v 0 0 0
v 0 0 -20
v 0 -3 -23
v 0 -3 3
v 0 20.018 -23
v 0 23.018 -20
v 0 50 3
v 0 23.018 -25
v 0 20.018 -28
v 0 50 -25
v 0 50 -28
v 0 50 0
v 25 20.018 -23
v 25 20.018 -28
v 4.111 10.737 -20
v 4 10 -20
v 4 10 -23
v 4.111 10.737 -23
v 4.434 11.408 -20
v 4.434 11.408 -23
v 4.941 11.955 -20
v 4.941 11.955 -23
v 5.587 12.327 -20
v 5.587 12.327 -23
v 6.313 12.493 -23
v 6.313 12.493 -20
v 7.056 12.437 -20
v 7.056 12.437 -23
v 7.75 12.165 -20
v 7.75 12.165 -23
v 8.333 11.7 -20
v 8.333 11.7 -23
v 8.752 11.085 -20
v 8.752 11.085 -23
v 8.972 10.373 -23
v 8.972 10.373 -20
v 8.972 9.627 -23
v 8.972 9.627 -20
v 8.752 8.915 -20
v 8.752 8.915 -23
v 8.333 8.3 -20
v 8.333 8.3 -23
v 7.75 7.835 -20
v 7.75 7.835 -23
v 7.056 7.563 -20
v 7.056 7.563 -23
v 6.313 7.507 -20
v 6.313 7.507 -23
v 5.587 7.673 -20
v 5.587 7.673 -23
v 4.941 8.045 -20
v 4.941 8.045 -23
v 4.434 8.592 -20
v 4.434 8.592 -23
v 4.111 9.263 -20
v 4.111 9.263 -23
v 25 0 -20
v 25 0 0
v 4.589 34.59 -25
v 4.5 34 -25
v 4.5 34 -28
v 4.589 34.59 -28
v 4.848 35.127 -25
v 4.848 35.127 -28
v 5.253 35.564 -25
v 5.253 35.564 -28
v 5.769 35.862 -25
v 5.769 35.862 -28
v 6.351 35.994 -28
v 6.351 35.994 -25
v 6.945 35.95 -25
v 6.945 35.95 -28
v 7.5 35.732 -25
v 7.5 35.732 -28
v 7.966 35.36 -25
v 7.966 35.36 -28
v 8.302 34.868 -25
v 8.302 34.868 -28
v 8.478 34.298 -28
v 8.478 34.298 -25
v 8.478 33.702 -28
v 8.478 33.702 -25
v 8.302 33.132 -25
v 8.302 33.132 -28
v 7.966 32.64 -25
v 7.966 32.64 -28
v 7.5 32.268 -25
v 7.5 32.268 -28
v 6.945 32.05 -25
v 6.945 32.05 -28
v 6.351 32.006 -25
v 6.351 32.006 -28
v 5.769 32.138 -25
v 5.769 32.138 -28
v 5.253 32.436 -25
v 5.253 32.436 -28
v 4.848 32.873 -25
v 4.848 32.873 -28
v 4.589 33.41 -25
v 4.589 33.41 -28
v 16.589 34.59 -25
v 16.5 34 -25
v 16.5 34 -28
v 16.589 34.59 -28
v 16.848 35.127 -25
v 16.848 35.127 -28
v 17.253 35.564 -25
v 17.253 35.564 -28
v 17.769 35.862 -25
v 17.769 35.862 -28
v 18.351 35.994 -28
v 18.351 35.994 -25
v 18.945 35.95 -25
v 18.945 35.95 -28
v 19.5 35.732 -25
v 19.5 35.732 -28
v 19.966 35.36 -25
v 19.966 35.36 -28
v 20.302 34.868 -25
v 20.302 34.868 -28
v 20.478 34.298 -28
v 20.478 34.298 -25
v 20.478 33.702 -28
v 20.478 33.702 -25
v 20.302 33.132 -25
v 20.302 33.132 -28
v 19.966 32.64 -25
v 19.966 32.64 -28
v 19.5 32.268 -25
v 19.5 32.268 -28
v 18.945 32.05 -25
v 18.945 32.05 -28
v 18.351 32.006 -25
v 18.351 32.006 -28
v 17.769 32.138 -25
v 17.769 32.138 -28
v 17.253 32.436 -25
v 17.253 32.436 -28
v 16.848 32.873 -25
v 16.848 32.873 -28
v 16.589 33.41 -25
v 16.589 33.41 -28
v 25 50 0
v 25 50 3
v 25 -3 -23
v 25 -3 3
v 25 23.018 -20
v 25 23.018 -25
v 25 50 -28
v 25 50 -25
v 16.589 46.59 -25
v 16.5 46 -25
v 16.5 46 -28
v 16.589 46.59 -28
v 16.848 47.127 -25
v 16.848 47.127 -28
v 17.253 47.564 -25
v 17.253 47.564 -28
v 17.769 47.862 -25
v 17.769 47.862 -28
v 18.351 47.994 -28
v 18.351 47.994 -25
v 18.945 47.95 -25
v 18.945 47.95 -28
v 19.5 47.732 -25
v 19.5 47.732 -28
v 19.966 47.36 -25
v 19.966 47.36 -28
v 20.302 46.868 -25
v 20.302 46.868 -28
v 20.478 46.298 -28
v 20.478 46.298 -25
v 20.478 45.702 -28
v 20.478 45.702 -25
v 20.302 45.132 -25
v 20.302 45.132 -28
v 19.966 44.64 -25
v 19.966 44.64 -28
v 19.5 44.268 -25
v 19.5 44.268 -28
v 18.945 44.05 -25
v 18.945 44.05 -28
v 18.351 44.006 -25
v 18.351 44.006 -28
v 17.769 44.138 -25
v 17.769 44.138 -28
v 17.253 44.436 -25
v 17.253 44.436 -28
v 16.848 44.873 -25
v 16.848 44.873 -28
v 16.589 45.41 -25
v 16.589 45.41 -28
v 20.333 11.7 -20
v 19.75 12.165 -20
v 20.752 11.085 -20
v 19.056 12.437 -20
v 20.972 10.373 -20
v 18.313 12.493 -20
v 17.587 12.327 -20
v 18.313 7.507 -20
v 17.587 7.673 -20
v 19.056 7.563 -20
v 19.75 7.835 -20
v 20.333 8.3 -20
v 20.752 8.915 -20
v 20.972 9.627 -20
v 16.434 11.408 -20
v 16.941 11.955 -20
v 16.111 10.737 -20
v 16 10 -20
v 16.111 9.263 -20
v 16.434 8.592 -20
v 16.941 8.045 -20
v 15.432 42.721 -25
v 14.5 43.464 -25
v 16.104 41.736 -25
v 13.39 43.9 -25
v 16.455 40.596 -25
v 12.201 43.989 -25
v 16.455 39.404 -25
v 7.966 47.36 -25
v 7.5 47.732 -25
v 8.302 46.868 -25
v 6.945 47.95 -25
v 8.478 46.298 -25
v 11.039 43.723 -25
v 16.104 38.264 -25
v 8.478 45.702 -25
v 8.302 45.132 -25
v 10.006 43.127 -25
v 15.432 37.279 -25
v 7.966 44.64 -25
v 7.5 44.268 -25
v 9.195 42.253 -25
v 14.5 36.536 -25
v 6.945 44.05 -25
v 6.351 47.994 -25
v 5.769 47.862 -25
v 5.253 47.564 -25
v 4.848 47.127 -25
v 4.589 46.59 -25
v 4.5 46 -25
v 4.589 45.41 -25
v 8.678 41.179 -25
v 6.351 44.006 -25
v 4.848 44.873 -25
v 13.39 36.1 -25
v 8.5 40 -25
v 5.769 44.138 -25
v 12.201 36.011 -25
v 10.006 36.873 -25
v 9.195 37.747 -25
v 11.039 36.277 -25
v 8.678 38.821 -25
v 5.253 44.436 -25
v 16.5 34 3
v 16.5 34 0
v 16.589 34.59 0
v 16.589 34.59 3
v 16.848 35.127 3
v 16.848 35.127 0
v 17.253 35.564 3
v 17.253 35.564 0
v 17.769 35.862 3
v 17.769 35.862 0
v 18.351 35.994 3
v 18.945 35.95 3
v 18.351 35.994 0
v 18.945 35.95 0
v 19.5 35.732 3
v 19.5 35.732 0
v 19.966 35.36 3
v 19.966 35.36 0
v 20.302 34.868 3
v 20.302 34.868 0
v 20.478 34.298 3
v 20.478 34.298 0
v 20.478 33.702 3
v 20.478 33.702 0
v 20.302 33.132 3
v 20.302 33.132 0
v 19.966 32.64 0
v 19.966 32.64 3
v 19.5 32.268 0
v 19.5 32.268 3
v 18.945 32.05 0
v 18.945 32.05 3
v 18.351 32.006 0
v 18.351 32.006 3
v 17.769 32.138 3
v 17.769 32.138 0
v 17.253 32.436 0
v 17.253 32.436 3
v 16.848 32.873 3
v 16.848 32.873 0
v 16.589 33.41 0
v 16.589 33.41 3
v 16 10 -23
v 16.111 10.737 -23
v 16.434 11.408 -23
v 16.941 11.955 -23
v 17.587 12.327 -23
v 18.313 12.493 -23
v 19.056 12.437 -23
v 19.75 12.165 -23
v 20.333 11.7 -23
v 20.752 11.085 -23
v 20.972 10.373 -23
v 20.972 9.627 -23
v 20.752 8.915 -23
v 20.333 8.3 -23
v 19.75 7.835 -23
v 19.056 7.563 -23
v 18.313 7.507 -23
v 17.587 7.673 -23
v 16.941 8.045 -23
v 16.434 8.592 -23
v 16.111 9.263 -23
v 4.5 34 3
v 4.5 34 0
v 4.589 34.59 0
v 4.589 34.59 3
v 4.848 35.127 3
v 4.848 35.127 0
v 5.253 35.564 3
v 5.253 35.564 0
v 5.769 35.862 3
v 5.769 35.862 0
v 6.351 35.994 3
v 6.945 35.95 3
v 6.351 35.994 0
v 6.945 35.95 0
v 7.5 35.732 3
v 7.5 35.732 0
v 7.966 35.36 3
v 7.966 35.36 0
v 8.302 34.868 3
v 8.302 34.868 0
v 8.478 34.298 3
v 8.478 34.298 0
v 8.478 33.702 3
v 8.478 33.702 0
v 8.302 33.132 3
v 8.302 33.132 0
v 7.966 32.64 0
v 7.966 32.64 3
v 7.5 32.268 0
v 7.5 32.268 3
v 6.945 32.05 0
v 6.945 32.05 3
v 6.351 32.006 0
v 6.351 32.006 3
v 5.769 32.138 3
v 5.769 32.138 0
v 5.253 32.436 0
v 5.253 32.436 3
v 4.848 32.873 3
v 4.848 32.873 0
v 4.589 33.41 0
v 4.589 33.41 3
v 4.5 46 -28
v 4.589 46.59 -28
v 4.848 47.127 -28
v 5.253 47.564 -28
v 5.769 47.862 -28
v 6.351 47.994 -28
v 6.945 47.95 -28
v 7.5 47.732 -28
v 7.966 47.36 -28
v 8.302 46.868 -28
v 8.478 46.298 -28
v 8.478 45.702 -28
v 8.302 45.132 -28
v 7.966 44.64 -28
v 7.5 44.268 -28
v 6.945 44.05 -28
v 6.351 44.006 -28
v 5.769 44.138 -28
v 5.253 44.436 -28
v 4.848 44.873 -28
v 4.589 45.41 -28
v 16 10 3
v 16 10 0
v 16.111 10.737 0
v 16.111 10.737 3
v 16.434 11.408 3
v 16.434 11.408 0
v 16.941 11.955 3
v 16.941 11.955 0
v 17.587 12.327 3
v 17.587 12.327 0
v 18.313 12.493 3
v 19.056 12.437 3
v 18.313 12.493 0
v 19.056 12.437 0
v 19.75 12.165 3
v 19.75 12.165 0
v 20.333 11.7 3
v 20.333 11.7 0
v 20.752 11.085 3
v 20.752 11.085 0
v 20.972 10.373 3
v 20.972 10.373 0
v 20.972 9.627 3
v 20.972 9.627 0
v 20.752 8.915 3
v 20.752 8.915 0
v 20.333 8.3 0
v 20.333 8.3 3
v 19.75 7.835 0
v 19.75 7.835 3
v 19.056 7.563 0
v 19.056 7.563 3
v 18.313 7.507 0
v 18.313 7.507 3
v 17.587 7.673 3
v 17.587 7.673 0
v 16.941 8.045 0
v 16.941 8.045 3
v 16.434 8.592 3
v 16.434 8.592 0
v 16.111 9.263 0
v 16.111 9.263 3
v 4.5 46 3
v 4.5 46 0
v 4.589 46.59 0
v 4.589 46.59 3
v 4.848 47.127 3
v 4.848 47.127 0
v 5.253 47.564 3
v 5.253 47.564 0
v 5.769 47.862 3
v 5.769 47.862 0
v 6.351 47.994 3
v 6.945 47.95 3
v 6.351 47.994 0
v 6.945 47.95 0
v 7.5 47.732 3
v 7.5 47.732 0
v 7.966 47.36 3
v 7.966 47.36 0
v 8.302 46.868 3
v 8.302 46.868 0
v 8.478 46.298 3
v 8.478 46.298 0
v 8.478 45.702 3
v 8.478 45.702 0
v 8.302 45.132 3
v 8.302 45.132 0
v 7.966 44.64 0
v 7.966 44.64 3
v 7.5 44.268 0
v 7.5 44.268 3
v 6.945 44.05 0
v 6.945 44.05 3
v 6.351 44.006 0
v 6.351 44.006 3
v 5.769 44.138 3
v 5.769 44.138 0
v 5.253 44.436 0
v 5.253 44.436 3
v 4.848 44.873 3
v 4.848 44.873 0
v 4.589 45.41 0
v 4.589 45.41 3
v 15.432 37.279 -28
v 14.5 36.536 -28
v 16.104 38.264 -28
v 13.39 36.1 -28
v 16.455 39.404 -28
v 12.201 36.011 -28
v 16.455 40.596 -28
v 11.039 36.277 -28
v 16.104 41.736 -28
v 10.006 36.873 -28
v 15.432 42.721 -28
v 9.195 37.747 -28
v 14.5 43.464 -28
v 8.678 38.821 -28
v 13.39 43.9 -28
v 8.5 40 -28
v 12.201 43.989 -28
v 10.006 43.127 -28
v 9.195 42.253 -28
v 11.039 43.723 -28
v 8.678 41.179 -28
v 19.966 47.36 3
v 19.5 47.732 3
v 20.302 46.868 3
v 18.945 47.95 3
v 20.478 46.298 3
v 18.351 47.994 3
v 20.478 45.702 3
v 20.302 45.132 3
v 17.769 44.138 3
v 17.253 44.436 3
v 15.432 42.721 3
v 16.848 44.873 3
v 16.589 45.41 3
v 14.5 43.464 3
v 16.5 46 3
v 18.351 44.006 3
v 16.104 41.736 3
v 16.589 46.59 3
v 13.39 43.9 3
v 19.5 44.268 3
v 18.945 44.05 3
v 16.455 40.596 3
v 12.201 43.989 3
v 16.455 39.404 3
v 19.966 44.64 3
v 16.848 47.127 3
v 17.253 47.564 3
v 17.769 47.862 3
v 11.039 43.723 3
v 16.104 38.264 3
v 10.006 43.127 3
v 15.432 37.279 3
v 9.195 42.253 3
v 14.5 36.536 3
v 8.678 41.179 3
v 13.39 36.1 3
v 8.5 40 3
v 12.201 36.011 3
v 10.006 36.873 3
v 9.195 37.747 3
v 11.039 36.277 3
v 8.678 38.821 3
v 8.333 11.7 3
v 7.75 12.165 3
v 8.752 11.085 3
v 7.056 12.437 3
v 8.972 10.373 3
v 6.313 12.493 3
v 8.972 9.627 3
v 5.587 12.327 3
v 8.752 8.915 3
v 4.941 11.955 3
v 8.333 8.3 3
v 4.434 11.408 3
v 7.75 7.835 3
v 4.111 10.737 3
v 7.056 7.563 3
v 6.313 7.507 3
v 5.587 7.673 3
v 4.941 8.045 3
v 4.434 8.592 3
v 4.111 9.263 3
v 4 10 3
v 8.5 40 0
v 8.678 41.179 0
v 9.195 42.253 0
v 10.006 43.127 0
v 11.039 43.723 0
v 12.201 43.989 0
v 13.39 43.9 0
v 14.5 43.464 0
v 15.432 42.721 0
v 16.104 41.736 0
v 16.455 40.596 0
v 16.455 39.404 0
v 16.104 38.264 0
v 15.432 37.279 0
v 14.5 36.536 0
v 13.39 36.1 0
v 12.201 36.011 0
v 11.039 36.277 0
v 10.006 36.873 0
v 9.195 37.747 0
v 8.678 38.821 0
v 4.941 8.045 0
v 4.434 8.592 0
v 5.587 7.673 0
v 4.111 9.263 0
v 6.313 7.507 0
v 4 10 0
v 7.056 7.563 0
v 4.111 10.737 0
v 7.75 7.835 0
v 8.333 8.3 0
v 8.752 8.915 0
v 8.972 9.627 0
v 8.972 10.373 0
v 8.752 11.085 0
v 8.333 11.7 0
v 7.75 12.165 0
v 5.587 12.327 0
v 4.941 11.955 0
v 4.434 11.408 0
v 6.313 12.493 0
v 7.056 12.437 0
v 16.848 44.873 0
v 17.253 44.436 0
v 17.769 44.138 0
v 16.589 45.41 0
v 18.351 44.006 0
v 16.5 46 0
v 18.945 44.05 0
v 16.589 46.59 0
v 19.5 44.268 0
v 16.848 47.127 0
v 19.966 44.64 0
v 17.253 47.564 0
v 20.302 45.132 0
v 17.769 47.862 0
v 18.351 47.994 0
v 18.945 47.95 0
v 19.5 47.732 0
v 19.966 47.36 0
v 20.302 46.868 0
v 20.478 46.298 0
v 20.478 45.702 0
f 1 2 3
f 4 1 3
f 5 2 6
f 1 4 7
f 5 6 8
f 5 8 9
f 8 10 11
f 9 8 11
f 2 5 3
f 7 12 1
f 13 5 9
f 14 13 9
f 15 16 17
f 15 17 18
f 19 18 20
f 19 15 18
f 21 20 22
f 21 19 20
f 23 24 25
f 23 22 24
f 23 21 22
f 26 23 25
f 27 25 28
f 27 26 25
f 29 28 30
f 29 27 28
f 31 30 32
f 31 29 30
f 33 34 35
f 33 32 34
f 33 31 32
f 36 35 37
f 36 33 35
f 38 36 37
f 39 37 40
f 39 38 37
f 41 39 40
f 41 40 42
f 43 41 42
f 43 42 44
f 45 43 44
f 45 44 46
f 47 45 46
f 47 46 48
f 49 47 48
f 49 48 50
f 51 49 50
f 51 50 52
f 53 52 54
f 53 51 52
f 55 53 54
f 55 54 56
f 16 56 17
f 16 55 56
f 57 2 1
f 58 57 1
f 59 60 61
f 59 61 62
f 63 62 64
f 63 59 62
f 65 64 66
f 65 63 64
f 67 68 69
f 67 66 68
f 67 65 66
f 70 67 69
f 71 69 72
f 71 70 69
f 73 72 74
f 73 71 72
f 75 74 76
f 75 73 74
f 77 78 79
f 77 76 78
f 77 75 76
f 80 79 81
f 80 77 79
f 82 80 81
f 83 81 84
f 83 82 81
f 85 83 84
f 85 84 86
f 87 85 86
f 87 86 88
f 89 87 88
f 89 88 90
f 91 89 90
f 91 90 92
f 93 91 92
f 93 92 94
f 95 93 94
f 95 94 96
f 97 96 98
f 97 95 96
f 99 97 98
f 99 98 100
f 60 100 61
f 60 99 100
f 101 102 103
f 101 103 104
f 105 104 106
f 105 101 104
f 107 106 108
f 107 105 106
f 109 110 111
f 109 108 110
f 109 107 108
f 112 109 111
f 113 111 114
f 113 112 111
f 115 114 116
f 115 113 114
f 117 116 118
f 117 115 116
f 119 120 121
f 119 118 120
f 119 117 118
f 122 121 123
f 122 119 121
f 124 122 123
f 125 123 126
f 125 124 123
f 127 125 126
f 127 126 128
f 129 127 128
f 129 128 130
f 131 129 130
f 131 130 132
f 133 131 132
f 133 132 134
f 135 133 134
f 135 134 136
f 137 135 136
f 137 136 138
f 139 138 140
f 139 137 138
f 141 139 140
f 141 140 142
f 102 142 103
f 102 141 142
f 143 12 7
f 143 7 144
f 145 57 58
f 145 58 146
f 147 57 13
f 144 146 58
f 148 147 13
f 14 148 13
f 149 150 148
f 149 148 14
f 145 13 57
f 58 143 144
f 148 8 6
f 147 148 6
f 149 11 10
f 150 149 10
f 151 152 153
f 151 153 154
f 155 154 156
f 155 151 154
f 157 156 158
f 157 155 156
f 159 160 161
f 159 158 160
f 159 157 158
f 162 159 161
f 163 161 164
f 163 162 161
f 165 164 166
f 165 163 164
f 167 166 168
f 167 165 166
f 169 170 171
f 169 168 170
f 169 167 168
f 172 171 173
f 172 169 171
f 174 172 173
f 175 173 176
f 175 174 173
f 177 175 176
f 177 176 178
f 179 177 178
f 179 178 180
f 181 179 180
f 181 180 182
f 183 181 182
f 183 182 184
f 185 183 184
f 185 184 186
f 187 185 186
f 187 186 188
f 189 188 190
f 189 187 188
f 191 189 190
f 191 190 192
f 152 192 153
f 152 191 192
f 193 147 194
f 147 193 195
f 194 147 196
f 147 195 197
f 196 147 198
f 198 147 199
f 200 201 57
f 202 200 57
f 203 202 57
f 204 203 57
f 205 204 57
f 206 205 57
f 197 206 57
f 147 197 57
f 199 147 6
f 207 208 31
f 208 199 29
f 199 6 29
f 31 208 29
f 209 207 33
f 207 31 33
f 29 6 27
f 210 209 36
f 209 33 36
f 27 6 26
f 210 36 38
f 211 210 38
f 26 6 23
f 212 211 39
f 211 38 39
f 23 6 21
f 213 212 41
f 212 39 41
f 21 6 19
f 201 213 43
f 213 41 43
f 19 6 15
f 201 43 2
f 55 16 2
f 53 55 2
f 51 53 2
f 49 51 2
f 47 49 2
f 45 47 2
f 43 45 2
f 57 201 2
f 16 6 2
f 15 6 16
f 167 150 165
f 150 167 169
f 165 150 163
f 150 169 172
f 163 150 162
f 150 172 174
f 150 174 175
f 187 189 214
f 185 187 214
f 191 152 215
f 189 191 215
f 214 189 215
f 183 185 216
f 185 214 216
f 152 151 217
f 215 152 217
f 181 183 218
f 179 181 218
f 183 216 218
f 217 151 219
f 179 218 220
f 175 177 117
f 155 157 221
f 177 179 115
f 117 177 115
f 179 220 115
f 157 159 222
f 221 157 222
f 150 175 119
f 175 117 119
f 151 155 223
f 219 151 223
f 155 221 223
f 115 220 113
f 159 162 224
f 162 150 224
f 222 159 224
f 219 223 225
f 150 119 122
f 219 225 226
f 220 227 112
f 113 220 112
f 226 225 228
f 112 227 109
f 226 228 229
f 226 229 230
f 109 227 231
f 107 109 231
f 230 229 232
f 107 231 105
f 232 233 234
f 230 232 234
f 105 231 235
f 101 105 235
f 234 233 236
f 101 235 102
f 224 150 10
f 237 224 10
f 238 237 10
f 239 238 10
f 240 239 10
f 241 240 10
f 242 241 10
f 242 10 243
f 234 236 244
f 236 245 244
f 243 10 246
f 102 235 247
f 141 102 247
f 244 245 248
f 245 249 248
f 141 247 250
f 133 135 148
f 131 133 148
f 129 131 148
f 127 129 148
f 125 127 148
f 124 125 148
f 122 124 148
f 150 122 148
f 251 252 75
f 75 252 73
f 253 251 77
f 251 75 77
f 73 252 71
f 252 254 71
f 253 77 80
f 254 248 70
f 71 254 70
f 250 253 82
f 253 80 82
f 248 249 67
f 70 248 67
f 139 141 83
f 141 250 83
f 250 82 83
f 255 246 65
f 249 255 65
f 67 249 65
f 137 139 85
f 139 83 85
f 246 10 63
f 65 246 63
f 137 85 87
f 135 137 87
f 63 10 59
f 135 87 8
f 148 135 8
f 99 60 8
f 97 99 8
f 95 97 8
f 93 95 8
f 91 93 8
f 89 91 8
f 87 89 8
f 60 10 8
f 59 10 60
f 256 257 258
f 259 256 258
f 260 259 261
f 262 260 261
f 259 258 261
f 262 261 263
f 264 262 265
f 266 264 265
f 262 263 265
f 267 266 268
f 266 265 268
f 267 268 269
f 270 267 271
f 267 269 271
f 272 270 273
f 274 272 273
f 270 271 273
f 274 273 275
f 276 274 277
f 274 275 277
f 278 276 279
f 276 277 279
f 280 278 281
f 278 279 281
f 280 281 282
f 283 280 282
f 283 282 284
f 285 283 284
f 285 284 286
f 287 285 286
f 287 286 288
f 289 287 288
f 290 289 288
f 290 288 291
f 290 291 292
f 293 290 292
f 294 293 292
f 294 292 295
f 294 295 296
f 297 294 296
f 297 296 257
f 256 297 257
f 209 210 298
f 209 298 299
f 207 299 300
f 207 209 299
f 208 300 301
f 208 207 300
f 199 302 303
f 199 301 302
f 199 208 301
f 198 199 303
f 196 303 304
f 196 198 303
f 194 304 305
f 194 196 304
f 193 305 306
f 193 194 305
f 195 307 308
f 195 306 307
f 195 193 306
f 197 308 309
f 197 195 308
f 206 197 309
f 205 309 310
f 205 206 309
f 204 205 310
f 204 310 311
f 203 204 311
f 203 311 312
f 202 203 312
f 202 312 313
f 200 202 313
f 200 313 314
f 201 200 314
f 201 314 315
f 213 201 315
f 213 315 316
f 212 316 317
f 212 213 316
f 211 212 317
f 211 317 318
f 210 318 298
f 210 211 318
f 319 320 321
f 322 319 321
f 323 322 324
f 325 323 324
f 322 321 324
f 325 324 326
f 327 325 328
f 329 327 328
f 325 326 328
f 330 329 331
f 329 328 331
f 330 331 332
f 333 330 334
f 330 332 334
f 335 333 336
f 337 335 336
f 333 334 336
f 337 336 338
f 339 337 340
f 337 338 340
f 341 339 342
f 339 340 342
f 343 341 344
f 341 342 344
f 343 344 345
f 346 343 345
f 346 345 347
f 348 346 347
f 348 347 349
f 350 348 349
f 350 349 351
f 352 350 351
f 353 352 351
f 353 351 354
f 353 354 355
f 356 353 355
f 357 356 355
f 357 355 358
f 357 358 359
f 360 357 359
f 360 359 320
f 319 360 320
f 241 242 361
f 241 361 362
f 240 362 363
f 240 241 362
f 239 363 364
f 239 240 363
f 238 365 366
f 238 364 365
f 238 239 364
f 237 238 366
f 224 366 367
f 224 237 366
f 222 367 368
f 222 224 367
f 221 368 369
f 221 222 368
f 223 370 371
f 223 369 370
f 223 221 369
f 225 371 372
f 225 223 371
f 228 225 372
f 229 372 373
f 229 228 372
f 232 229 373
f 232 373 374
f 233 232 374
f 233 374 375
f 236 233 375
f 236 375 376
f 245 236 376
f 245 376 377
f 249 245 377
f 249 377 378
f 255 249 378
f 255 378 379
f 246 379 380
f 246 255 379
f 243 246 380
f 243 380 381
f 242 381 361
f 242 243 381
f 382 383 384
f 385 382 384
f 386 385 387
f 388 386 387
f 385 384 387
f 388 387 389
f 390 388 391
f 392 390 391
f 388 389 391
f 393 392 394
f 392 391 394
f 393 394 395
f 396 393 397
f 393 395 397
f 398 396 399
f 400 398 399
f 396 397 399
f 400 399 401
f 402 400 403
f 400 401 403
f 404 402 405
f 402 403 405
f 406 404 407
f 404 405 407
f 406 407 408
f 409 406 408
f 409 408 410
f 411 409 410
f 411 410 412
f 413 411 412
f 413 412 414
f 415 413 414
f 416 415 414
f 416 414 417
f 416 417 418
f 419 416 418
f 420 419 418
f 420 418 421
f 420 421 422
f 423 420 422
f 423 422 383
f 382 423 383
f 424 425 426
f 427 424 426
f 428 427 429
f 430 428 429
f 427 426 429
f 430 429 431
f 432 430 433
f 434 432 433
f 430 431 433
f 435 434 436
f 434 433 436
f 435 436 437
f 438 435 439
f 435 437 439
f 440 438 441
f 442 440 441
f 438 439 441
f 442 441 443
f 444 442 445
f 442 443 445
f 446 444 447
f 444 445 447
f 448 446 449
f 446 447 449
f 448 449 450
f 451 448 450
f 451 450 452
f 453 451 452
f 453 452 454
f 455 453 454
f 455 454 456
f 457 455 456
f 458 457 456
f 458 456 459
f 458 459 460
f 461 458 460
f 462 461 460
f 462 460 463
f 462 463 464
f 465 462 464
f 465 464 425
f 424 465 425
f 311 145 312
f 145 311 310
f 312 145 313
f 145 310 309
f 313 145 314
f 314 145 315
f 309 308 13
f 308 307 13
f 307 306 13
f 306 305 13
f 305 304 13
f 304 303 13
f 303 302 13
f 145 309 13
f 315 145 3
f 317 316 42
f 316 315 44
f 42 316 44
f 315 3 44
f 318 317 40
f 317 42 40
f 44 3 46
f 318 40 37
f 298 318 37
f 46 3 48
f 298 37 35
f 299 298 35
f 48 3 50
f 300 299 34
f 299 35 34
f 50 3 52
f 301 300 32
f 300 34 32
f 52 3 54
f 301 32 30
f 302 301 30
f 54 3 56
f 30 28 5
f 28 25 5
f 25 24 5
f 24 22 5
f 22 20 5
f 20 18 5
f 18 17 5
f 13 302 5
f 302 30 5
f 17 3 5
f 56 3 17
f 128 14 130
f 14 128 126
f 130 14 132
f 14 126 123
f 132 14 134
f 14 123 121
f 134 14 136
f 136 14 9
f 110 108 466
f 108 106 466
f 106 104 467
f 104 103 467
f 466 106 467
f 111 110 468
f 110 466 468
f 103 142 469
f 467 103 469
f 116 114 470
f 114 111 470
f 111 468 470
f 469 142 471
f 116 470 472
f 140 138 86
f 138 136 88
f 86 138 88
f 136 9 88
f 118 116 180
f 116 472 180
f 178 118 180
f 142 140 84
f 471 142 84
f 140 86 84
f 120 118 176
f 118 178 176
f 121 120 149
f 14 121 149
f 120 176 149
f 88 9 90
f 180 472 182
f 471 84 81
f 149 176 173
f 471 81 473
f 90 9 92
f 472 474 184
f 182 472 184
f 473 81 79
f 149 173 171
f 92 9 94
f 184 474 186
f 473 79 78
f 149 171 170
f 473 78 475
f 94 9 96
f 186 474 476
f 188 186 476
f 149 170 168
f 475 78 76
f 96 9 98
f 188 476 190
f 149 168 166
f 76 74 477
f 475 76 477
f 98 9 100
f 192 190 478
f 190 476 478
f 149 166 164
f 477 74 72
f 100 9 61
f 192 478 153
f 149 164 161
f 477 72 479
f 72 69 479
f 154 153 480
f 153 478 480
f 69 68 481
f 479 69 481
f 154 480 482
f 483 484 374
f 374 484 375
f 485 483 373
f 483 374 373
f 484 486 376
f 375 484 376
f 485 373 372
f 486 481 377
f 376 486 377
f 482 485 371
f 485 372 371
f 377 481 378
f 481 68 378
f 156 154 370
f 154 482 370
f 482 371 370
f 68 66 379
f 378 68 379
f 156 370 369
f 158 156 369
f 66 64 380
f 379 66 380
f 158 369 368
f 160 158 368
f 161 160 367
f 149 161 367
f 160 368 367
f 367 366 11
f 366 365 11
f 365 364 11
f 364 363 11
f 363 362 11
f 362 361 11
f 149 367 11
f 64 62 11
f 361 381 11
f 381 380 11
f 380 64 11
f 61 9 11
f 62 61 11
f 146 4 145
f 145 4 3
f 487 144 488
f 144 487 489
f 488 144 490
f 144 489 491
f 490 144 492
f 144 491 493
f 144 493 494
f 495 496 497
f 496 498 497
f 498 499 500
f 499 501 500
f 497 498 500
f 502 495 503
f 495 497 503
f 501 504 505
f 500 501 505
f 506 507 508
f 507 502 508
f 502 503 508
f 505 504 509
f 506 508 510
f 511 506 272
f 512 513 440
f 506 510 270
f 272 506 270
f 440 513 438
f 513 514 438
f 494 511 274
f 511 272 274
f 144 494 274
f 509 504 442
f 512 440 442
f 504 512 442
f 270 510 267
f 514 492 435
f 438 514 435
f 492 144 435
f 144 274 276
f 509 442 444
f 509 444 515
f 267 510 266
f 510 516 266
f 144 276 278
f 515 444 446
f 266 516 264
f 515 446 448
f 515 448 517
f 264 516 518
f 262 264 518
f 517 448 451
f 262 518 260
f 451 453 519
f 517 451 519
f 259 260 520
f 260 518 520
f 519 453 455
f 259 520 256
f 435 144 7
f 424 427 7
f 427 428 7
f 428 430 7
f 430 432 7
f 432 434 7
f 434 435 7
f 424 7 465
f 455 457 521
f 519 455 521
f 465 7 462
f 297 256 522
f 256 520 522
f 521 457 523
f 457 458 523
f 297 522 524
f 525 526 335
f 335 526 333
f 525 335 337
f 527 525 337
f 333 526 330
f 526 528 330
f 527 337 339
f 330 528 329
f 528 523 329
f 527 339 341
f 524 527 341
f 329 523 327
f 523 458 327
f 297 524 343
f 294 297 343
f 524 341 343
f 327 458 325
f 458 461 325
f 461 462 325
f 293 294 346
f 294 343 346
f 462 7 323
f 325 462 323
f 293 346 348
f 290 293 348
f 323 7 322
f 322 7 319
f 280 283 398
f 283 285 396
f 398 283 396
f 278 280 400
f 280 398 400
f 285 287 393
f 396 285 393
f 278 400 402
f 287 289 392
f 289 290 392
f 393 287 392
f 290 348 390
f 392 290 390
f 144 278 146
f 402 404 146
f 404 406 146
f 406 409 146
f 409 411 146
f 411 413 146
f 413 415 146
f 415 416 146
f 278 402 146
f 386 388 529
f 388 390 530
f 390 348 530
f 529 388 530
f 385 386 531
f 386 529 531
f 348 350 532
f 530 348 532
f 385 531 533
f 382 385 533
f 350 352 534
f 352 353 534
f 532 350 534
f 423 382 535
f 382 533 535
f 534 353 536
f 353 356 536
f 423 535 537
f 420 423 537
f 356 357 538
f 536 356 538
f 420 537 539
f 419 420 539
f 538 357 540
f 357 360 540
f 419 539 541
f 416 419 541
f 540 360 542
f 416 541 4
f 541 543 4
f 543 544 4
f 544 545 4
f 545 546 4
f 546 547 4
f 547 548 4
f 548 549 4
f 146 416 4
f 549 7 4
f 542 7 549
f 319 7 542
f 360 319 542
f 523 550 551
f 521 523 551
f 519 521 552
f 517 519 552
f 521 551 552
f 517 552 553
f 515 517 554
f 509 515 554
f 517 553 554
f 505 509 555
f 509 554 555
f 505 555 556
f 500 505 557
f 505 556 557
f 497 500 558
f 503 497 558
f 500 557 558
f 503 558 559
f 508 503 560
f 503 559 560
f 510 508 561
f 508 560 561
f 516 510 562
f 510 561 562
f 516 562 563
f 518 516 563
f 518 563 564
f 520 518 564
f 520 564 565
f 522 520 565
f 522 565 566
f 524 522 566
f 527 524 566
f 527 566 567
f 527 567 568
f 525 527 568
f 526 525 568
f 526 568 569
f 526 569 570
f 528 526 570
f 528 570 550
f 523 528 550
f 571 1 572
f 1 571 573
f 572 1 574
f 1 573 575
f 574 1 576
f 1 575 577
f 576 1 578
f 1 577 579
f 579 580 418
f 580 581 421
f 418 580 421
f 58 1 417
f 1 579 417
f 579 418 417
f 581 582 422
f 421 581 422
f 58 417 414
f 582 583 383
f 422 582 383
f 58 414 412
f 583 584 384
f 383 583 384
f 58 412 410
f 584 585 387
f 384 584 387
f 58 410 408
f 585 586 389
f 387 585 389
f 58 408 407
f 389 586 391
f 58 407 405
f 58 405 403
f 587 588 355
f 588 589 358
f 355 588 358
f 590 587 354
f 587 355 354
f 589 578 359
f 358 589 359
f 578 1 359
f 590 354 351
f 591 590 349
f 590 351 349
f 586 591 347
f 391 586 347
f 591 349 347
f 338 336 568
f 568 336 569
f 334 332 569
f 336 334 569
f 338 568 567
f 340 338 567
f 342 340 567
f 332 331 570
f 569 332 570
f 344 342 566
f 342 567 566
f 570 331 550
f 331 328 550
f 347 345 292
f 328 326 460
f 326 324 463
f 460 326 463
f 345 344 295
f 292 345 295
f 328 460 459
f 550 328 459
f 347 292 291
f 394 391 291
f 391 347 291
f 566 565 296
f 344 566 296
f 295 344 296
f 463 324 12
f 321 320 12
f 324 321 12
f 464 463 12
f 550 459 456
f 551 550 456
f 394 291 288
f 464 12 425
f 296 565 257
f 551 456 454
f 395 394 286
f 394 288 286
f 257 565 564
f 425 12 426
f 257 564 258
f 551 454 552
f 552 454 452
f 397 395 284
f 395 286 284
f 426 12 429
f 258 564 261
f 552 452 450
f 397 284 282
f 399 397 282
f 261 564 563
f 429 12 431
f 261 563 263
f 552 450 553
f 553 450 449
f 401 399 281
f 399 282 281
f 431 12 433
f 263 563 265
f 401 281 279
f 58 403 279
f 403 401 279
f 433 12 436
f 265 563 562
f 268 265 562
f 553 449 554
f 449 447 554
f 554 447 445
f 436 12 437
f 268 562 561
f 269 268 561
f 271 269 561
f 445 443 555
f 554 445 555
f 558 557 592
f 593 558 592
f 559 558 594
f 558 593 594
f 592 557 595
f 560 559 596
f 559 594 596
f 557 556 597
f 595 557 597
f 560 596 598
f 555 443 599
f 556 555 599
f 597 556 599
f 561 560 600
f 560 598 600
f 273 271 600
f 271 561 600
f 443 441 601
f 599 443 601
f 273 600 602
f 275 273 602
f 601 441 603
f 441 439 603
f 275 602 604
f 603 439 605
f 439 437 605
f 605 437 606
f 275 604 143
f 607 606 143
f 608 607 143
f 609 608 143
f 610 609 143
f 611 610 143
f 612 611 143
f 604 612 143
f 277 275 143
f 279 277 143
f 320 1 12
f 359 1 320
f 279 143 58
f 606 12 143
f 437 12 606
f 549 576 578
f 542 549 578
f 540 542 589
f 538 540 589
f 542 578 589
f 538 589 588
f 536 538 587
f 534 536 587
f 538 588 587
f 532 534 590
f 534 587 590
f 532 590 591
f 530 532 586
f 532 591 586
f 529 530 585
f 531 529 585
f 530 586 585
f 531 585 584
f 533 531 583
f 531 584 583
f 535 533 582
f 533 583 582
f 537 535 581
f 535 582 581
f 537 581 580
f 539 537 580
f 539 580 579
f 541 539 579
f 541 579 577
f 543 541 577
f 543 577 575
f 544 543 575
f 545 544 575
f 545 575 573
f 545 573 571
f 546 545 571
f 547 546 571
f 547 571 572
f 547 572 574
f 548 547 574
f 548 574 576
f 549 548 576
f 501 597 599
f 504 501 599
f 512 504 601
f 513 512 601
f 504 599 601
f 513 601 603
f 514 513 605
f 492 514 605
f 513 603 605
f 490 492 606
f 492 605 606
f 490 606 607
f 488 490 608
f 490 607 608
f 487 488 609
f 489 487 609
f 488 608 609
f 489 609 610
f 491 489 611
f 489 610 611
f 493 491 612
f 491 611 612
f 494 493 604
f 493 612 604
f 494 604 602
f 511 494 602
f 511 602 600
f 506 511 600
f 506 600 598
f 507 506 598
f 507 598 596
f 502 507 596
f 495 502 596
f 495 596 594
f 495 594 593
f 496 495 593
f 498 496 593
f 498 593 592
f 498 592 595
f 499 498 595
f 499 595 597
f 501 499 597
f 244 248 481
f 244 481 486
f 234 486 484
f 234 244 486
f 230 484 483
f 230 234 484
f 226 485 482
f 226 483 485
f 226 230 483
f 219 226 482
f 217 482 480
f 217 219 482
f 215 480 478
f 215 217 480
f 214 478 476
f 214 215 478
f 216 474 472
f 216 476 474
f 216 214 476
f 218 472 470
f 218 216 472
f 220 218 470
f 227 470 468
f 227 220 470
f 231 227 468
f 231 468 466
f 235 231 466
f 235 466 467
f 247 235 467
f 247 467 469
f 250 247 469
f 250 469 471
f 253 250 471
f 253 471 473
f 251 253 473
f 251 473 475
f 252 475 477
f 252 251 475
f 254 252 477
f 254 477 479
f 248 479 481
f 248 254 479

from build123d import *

# Parameters (mm, degrees)
SKETCH_1_W                      = 25
SKETCH_1_H                      = 50
EXTRUDE_1_DEPTH                 = 3
EXTRUDE_2_DEPTH                 = 25
CUT_EXTRUDE_1_REACH             = 5
SKETCH_2_R                      = 2.5
SKETCH_2_R_2                    = 4
SKETCH_2_R_3                    = 2
CUT_EXTRUDE_1_DIRECTION_2_REACH = 30


with BuildPart() as part:
    # 草图1 → 凸台-拉伸1 (new body)
    with BuildSketch(Plane.XY):
        with Locations((12.5, 25)):
            Rectangle(SKETCH_1_W, SKETCH_1_H)
    extrude(amount=EXTRUDE_1_DEPTH)

    # 草图4 → 凸台-拉伸2 (add)
    with BuildSketch(Plane.ZY):
        Polygon((-23, -3), (-23, 20.018133071), (-28, 20.018133071), (-28, 50), (-25, 50), (-25, 23.018133071), (-20, 23.018133071), (-20, 0), (3, 0), (3, -3), align=None)
    extrude(amount=-EXTRUDE_2_DEPTH)

    # 草图2 → 切除-拉伸1 (cut, up to next)
    with BuildSketch(Plane(origin=(0, 0, 0), x_dir=(-1, 0, 0), z_dir=(0, 0, -1)), mode=Mode.PRIVATE) as cut_extrude_1_sk1:
        with Locations((-18.5, 10)):
            Circle(SKETCH_2_R)
    cut_extrude_1_tool1 = extrude(cut_extrude_1_sk1.sketch, amount=-CUT_EXTRUDE_1_REACH, mode=Mode.PRIVATE) & part.part
    add(cut_extrude_1_tool1.solids().sort_by_distance((18.5, 10, 0))[0], mode=Mode.SUBTRACT)
    # 草图2 → 切除-拉伸1 (cut, up to next)
    with BuildSketch(Plane(origin=(0, 0, 0), x_dir=(-1, 0, 0), z_dir=(0, 0, -1)), mode=Mode.PRIVATE) as cut_extrude_1_sk2:
        with Locations((-6.5, 10)):
            Circle(SKETCH_2_R)
    cut_extrude_1_tool2 = extrude(cut_extrude_1_sk2.sketch, amount=-CUT_EXTRUDE_1_REACH, mode=Mode.PRIVATE) & part.part
    add(cut_extrude_1_tool2.solids().sort_by_distance((6.5, 10, 0))[0], mode=Mode.SUBTRACT)
    # 草图2 → 切除-拉伸1 (cut, up to next)
    with BuildSketch(Plane(origin=(0, 0, 0), x_dir=(-1, 0, 0), z_dir=(0, 0, -1)), mode=Mode.PRIVATE) as cut_extrude_1_sk3:
        with Locations((-12.5, 40)):
            Circle(SKETCH_2_R_2)
    cut_extrude_1_tool3 = extrude(cut_extrude_1_sk3.sketch, amount=-CUT_EXTRUDE_1_REACH, mode=Mode.PRIVATE) & part.part
    add(cut_extrude_1_tool3.solids().sort_by_distance((12.5, 40, 0))[0], mode=Mode.SUBTRACT)
    # 草图2 → 切除-拉伸1 (cut, up to next)
    with BuildSketch(Plane(origin=(0, 0, 0), x_dir=(-1, 0, 0), z_dir=(0, 0, -1)), mode=Mode.PRIVATE) as cut_extrude_1_sk4:
        with Locations((-6.5, 46)):
            Circle(SKETCH_2_R_3)
    cut_extrude_1_tool4 = extrude(cut_extrude_1_sk4.sketch, amount=-CUT_EXTRUDE_1_REACH, mode=Mode.PRIVATE) & part.part
    add(cut_extrude_1_tool4.solids().sort_by_distance((6.5, 46, 0))[0], mode=Mode.SUBTRACT)
    # 草图2 → 切除-拉伸1 (cut, up to next)
    with BuildSketch(Plane(origin=(0, 0, 0), x_dir=(-1, 0, 0), z_dir=(0, 0, -1)), mode=Mode.PRIVATE) as cut_extrude_1_sk5:
        with Locations((-6.5, 34)):
            Circle(SKETCH_2_R_3)
    cut_extrude_1_tool5 = extrude(cut_extrude_1_sk5.sketch, amount=-CUT_EXTRUDE_1_REACH, mode=Mode.PRIVATE) & part.part
    add(cut_extrude_1_tool5.solids().sort_by_distance((6.5, 34, 0))[0], mode=Mode.SUBTRACT)
    # 草图2 → 切除-拉伸1 (cut, up to next)
    with BuildSketch(Plane(origin=(0, 0, 0), x_dir=(-1, 0, 0), z_dir=(0, 0, -1)), mode=Mode.PRIVATE) as cut_extrude_1_sk6:
        with Locations((-18.5, 34)):
            Circle(SKETCH_2_R_3)
    cut_extrude_1_tool6 = extrude(cut_extrude_1_sk6.sketch, amount=-CUT_EXTRUDE_1_REACH, mode=Mode.PRIVATE) & part.part
    add(cut_extrude_1_tool6.solids().sort_by_distance((18.5, 34, 0))[0], mode=Mode.SUBTRACT)
    # 草图2 → 切除-拉伸1 (cut, up to next)
    with BuildSketch(Plane(origin=(0, 0, 0), x_dir=(-1, 0, 0), z_dir=(0, 0, -1)), mode=Mode.PRIVATE) as cut_extrude_1_sk7:
        with Locations((-18.5, 46)):
            Circle(SKETCH_2_R_3)
    cut_extrude_1_tool7 = extrude(cut_extrude_1_sk7.sketch, amount=-CUT_EXTRUDE_1_REACH, mode=Mode.PRIVATE) & part.part
    add(cut_extrude_1_tool7.solids().sort_by_distance((18.5, 46, 0))[0], mode=Mode.SUBTRACT)

    # 草图2 → 切除-拉伸1 direction 2 (cut, up to next)
    with BuildSketch(Plane(origin=(0, 0, 0), x_dir=(-1, 0, 0), z_dir=(0, 0, -1)), mode=Mode.PRIVATE) as cut_extrude_1_direction_2_sk1:
        with Locations((-18.5, 10)):
            Circle(SKETCH_2_R)
    cut_extrude_1_direction_2_tool1 = extrude(cut_extrude_1_direction_2_sk1.sketch, amount=CUT_EXTRUDE_1_DIRECTION_2_REACH, mode=Mode.PRIVATE) & part.part
    add(cut_extrude_1_direction_2_tool1.solids().sort_by_distance((18.5, 10, 0))[0], mode=Mode.SUBTRACT)
    # 草图2 → 切除-拉伸1 direction 2 (cut, up to next)
    with BuildSketch(Plane(origin=(0, 0, 0), x_dir=(-1, 0, 0), z_dir=(0, 0, -1)), mode=Mode.PRIVATE) as cut_extrude_1_direction_2_sk2:
        with Locations((-6.5, 10)):
            Circle(SKETCH_2_R)
    cut_extrude_1_direction_2_tool2 = extrude(cut_extrude_1_direction_2_sk2.sketch, amount=CUT_EXTRUDE_1_DIRECTION_2_REACH, mode=Mode.PRIVATE) & part.part
    add(cut_extrude_1_direction_2_tool2.solids().sort_by_distance((6.5, 10, 0))[0], mode=Mode.SUBTRACT)
    # 草图2 → 切除-拉伸1 direction 2 (cut, up to next)
    with BuildSketch(Plane(origin=(0, 0, 0), x_dir=(-1, 0, 0), z_dir=(0, 0, -1)), mode=Mode.PRIVATE) as cut_extrude_1_direction_2_sk3:
        with Locations((-12.5, 40)):
            Circle(SKETCH_2_R_2)
    cut_extrude_1_direction_2_tool3 = extrude(cut_extrude_1_direction_2_sk3.sketch, amount=CUT_EXTRUDE_1_DIRECTION_2_REACH, mode=Mode.PRIVATE) & part.part
    add(cut_extrude_1_direction_2_tool3.solids().sort_by_distance((12.5, 40, 0))[0], mode=Mode.SUBTRACT)
    # 草图2 → 切除-拉伸1 direction 2 (cut, up to next)
    with BuildSketch(Plane(origin=(0, 0, 0), x_dir=(-1, 0, 0), z_dir=(0, 0, -1)), mode=Mode.PRIVATE) as cut_extrude_1_direction_2_sk4:
        with Locations((-6.5, 46)):
            Circle(SKETCH_2_R_3)
    cut_extrude_1_direction_2_tool4 = extrude(cut_extrude_1_direction_2_sk4.sketch, amount=CUT_EXTRUDE_1_DIRECTION_2_REACH, mode=Mode.PRIVATE) & part.part
    add(cut_extrude_1_direction_2_tool4.solids().sort_by_distance((6.5, 46, 0))[0], mode=Mode.SUBTRACT)
    # 草图2 → 切除-拉伸1 direction 2 (cut, up to next)
    with BuildSketch(Plane(origin=(0, 0, 0), x_dir=(-1, 0, 0), z_dir=(0, 0, -1)), mode=Mode.PRIVATE) as cut_extrude_1_direction_2_sk5:
        with Locations((-6.5, 34)):
            Circle(SKETCH_2_R_3)
    cut_extrude_1_direction_2_tool5 = extrude(cut_extrude_1_direction_2_sk5.sketch, amount=CUT_EXTRUDE_1_DIRECTION_2_REACH, mode=Mode.PRIVATE) & part.part
    add(cut_extrude_1_direction_2_tool5.solids().sort_by_distance((6.5, 34, 0))[0], mode=Mode.SUBTRACT)
    # 草图2 → 切除-拉伸1 direction 2 (cut, up to next)
    with BuildSketch(Plane(origin=(0, 0, 0), x_dir=(-1, 0, 0), z_dir=(0, 0, -1)), mode=Mode.PRIVATE) as cut_extrude_1_direction_2_sk6:
        with Locations((-18.5, 34)):
            Circle(SKETCH_2_R_3)
    cut_extrude_1_direction_2_tool6 = extrude(cut_extrude_1_direction_2_sk6.sketch, amount=CUT_EXTRUDE_1_DIRECTION_2_REACH, mode=Mode.PRIVATE) & part.part
    add(cut_extrude_1_direction_2_tool6.solids().sort_by_distance((18.5, 34, 0))[0], mode=Mode.SUBTRACT)
    # 草图2 → 切除-拉伸1 direction 2 (cut, up to next)
    with BuildSketch(Plane(origin=(0, 0, 0), x_dir=(-1, 0, 0), z_dir=(0, 0, -1)), mode=Mode.PRIVATE) as cut_extrude_1_direction_2_sk7:
        with Locations((-18.5, 46)):
            Circle(SKETCH_2_R_3)
    cut_extrude_1_direction_2_tool7 = extrude(cut_extrude_1_direction_2_sk7.sketch, amount=CUT_EXTRUDE_1_DIRECTION_2_REACH, mode=Mode.PRIVATE) & part.part
    add(cut_extrude_1_direction_2_tool7.solids().sort_by_distance((18.5, 46, 0))[0], mode=Mode.SUBTRACT)


solid = part.part
